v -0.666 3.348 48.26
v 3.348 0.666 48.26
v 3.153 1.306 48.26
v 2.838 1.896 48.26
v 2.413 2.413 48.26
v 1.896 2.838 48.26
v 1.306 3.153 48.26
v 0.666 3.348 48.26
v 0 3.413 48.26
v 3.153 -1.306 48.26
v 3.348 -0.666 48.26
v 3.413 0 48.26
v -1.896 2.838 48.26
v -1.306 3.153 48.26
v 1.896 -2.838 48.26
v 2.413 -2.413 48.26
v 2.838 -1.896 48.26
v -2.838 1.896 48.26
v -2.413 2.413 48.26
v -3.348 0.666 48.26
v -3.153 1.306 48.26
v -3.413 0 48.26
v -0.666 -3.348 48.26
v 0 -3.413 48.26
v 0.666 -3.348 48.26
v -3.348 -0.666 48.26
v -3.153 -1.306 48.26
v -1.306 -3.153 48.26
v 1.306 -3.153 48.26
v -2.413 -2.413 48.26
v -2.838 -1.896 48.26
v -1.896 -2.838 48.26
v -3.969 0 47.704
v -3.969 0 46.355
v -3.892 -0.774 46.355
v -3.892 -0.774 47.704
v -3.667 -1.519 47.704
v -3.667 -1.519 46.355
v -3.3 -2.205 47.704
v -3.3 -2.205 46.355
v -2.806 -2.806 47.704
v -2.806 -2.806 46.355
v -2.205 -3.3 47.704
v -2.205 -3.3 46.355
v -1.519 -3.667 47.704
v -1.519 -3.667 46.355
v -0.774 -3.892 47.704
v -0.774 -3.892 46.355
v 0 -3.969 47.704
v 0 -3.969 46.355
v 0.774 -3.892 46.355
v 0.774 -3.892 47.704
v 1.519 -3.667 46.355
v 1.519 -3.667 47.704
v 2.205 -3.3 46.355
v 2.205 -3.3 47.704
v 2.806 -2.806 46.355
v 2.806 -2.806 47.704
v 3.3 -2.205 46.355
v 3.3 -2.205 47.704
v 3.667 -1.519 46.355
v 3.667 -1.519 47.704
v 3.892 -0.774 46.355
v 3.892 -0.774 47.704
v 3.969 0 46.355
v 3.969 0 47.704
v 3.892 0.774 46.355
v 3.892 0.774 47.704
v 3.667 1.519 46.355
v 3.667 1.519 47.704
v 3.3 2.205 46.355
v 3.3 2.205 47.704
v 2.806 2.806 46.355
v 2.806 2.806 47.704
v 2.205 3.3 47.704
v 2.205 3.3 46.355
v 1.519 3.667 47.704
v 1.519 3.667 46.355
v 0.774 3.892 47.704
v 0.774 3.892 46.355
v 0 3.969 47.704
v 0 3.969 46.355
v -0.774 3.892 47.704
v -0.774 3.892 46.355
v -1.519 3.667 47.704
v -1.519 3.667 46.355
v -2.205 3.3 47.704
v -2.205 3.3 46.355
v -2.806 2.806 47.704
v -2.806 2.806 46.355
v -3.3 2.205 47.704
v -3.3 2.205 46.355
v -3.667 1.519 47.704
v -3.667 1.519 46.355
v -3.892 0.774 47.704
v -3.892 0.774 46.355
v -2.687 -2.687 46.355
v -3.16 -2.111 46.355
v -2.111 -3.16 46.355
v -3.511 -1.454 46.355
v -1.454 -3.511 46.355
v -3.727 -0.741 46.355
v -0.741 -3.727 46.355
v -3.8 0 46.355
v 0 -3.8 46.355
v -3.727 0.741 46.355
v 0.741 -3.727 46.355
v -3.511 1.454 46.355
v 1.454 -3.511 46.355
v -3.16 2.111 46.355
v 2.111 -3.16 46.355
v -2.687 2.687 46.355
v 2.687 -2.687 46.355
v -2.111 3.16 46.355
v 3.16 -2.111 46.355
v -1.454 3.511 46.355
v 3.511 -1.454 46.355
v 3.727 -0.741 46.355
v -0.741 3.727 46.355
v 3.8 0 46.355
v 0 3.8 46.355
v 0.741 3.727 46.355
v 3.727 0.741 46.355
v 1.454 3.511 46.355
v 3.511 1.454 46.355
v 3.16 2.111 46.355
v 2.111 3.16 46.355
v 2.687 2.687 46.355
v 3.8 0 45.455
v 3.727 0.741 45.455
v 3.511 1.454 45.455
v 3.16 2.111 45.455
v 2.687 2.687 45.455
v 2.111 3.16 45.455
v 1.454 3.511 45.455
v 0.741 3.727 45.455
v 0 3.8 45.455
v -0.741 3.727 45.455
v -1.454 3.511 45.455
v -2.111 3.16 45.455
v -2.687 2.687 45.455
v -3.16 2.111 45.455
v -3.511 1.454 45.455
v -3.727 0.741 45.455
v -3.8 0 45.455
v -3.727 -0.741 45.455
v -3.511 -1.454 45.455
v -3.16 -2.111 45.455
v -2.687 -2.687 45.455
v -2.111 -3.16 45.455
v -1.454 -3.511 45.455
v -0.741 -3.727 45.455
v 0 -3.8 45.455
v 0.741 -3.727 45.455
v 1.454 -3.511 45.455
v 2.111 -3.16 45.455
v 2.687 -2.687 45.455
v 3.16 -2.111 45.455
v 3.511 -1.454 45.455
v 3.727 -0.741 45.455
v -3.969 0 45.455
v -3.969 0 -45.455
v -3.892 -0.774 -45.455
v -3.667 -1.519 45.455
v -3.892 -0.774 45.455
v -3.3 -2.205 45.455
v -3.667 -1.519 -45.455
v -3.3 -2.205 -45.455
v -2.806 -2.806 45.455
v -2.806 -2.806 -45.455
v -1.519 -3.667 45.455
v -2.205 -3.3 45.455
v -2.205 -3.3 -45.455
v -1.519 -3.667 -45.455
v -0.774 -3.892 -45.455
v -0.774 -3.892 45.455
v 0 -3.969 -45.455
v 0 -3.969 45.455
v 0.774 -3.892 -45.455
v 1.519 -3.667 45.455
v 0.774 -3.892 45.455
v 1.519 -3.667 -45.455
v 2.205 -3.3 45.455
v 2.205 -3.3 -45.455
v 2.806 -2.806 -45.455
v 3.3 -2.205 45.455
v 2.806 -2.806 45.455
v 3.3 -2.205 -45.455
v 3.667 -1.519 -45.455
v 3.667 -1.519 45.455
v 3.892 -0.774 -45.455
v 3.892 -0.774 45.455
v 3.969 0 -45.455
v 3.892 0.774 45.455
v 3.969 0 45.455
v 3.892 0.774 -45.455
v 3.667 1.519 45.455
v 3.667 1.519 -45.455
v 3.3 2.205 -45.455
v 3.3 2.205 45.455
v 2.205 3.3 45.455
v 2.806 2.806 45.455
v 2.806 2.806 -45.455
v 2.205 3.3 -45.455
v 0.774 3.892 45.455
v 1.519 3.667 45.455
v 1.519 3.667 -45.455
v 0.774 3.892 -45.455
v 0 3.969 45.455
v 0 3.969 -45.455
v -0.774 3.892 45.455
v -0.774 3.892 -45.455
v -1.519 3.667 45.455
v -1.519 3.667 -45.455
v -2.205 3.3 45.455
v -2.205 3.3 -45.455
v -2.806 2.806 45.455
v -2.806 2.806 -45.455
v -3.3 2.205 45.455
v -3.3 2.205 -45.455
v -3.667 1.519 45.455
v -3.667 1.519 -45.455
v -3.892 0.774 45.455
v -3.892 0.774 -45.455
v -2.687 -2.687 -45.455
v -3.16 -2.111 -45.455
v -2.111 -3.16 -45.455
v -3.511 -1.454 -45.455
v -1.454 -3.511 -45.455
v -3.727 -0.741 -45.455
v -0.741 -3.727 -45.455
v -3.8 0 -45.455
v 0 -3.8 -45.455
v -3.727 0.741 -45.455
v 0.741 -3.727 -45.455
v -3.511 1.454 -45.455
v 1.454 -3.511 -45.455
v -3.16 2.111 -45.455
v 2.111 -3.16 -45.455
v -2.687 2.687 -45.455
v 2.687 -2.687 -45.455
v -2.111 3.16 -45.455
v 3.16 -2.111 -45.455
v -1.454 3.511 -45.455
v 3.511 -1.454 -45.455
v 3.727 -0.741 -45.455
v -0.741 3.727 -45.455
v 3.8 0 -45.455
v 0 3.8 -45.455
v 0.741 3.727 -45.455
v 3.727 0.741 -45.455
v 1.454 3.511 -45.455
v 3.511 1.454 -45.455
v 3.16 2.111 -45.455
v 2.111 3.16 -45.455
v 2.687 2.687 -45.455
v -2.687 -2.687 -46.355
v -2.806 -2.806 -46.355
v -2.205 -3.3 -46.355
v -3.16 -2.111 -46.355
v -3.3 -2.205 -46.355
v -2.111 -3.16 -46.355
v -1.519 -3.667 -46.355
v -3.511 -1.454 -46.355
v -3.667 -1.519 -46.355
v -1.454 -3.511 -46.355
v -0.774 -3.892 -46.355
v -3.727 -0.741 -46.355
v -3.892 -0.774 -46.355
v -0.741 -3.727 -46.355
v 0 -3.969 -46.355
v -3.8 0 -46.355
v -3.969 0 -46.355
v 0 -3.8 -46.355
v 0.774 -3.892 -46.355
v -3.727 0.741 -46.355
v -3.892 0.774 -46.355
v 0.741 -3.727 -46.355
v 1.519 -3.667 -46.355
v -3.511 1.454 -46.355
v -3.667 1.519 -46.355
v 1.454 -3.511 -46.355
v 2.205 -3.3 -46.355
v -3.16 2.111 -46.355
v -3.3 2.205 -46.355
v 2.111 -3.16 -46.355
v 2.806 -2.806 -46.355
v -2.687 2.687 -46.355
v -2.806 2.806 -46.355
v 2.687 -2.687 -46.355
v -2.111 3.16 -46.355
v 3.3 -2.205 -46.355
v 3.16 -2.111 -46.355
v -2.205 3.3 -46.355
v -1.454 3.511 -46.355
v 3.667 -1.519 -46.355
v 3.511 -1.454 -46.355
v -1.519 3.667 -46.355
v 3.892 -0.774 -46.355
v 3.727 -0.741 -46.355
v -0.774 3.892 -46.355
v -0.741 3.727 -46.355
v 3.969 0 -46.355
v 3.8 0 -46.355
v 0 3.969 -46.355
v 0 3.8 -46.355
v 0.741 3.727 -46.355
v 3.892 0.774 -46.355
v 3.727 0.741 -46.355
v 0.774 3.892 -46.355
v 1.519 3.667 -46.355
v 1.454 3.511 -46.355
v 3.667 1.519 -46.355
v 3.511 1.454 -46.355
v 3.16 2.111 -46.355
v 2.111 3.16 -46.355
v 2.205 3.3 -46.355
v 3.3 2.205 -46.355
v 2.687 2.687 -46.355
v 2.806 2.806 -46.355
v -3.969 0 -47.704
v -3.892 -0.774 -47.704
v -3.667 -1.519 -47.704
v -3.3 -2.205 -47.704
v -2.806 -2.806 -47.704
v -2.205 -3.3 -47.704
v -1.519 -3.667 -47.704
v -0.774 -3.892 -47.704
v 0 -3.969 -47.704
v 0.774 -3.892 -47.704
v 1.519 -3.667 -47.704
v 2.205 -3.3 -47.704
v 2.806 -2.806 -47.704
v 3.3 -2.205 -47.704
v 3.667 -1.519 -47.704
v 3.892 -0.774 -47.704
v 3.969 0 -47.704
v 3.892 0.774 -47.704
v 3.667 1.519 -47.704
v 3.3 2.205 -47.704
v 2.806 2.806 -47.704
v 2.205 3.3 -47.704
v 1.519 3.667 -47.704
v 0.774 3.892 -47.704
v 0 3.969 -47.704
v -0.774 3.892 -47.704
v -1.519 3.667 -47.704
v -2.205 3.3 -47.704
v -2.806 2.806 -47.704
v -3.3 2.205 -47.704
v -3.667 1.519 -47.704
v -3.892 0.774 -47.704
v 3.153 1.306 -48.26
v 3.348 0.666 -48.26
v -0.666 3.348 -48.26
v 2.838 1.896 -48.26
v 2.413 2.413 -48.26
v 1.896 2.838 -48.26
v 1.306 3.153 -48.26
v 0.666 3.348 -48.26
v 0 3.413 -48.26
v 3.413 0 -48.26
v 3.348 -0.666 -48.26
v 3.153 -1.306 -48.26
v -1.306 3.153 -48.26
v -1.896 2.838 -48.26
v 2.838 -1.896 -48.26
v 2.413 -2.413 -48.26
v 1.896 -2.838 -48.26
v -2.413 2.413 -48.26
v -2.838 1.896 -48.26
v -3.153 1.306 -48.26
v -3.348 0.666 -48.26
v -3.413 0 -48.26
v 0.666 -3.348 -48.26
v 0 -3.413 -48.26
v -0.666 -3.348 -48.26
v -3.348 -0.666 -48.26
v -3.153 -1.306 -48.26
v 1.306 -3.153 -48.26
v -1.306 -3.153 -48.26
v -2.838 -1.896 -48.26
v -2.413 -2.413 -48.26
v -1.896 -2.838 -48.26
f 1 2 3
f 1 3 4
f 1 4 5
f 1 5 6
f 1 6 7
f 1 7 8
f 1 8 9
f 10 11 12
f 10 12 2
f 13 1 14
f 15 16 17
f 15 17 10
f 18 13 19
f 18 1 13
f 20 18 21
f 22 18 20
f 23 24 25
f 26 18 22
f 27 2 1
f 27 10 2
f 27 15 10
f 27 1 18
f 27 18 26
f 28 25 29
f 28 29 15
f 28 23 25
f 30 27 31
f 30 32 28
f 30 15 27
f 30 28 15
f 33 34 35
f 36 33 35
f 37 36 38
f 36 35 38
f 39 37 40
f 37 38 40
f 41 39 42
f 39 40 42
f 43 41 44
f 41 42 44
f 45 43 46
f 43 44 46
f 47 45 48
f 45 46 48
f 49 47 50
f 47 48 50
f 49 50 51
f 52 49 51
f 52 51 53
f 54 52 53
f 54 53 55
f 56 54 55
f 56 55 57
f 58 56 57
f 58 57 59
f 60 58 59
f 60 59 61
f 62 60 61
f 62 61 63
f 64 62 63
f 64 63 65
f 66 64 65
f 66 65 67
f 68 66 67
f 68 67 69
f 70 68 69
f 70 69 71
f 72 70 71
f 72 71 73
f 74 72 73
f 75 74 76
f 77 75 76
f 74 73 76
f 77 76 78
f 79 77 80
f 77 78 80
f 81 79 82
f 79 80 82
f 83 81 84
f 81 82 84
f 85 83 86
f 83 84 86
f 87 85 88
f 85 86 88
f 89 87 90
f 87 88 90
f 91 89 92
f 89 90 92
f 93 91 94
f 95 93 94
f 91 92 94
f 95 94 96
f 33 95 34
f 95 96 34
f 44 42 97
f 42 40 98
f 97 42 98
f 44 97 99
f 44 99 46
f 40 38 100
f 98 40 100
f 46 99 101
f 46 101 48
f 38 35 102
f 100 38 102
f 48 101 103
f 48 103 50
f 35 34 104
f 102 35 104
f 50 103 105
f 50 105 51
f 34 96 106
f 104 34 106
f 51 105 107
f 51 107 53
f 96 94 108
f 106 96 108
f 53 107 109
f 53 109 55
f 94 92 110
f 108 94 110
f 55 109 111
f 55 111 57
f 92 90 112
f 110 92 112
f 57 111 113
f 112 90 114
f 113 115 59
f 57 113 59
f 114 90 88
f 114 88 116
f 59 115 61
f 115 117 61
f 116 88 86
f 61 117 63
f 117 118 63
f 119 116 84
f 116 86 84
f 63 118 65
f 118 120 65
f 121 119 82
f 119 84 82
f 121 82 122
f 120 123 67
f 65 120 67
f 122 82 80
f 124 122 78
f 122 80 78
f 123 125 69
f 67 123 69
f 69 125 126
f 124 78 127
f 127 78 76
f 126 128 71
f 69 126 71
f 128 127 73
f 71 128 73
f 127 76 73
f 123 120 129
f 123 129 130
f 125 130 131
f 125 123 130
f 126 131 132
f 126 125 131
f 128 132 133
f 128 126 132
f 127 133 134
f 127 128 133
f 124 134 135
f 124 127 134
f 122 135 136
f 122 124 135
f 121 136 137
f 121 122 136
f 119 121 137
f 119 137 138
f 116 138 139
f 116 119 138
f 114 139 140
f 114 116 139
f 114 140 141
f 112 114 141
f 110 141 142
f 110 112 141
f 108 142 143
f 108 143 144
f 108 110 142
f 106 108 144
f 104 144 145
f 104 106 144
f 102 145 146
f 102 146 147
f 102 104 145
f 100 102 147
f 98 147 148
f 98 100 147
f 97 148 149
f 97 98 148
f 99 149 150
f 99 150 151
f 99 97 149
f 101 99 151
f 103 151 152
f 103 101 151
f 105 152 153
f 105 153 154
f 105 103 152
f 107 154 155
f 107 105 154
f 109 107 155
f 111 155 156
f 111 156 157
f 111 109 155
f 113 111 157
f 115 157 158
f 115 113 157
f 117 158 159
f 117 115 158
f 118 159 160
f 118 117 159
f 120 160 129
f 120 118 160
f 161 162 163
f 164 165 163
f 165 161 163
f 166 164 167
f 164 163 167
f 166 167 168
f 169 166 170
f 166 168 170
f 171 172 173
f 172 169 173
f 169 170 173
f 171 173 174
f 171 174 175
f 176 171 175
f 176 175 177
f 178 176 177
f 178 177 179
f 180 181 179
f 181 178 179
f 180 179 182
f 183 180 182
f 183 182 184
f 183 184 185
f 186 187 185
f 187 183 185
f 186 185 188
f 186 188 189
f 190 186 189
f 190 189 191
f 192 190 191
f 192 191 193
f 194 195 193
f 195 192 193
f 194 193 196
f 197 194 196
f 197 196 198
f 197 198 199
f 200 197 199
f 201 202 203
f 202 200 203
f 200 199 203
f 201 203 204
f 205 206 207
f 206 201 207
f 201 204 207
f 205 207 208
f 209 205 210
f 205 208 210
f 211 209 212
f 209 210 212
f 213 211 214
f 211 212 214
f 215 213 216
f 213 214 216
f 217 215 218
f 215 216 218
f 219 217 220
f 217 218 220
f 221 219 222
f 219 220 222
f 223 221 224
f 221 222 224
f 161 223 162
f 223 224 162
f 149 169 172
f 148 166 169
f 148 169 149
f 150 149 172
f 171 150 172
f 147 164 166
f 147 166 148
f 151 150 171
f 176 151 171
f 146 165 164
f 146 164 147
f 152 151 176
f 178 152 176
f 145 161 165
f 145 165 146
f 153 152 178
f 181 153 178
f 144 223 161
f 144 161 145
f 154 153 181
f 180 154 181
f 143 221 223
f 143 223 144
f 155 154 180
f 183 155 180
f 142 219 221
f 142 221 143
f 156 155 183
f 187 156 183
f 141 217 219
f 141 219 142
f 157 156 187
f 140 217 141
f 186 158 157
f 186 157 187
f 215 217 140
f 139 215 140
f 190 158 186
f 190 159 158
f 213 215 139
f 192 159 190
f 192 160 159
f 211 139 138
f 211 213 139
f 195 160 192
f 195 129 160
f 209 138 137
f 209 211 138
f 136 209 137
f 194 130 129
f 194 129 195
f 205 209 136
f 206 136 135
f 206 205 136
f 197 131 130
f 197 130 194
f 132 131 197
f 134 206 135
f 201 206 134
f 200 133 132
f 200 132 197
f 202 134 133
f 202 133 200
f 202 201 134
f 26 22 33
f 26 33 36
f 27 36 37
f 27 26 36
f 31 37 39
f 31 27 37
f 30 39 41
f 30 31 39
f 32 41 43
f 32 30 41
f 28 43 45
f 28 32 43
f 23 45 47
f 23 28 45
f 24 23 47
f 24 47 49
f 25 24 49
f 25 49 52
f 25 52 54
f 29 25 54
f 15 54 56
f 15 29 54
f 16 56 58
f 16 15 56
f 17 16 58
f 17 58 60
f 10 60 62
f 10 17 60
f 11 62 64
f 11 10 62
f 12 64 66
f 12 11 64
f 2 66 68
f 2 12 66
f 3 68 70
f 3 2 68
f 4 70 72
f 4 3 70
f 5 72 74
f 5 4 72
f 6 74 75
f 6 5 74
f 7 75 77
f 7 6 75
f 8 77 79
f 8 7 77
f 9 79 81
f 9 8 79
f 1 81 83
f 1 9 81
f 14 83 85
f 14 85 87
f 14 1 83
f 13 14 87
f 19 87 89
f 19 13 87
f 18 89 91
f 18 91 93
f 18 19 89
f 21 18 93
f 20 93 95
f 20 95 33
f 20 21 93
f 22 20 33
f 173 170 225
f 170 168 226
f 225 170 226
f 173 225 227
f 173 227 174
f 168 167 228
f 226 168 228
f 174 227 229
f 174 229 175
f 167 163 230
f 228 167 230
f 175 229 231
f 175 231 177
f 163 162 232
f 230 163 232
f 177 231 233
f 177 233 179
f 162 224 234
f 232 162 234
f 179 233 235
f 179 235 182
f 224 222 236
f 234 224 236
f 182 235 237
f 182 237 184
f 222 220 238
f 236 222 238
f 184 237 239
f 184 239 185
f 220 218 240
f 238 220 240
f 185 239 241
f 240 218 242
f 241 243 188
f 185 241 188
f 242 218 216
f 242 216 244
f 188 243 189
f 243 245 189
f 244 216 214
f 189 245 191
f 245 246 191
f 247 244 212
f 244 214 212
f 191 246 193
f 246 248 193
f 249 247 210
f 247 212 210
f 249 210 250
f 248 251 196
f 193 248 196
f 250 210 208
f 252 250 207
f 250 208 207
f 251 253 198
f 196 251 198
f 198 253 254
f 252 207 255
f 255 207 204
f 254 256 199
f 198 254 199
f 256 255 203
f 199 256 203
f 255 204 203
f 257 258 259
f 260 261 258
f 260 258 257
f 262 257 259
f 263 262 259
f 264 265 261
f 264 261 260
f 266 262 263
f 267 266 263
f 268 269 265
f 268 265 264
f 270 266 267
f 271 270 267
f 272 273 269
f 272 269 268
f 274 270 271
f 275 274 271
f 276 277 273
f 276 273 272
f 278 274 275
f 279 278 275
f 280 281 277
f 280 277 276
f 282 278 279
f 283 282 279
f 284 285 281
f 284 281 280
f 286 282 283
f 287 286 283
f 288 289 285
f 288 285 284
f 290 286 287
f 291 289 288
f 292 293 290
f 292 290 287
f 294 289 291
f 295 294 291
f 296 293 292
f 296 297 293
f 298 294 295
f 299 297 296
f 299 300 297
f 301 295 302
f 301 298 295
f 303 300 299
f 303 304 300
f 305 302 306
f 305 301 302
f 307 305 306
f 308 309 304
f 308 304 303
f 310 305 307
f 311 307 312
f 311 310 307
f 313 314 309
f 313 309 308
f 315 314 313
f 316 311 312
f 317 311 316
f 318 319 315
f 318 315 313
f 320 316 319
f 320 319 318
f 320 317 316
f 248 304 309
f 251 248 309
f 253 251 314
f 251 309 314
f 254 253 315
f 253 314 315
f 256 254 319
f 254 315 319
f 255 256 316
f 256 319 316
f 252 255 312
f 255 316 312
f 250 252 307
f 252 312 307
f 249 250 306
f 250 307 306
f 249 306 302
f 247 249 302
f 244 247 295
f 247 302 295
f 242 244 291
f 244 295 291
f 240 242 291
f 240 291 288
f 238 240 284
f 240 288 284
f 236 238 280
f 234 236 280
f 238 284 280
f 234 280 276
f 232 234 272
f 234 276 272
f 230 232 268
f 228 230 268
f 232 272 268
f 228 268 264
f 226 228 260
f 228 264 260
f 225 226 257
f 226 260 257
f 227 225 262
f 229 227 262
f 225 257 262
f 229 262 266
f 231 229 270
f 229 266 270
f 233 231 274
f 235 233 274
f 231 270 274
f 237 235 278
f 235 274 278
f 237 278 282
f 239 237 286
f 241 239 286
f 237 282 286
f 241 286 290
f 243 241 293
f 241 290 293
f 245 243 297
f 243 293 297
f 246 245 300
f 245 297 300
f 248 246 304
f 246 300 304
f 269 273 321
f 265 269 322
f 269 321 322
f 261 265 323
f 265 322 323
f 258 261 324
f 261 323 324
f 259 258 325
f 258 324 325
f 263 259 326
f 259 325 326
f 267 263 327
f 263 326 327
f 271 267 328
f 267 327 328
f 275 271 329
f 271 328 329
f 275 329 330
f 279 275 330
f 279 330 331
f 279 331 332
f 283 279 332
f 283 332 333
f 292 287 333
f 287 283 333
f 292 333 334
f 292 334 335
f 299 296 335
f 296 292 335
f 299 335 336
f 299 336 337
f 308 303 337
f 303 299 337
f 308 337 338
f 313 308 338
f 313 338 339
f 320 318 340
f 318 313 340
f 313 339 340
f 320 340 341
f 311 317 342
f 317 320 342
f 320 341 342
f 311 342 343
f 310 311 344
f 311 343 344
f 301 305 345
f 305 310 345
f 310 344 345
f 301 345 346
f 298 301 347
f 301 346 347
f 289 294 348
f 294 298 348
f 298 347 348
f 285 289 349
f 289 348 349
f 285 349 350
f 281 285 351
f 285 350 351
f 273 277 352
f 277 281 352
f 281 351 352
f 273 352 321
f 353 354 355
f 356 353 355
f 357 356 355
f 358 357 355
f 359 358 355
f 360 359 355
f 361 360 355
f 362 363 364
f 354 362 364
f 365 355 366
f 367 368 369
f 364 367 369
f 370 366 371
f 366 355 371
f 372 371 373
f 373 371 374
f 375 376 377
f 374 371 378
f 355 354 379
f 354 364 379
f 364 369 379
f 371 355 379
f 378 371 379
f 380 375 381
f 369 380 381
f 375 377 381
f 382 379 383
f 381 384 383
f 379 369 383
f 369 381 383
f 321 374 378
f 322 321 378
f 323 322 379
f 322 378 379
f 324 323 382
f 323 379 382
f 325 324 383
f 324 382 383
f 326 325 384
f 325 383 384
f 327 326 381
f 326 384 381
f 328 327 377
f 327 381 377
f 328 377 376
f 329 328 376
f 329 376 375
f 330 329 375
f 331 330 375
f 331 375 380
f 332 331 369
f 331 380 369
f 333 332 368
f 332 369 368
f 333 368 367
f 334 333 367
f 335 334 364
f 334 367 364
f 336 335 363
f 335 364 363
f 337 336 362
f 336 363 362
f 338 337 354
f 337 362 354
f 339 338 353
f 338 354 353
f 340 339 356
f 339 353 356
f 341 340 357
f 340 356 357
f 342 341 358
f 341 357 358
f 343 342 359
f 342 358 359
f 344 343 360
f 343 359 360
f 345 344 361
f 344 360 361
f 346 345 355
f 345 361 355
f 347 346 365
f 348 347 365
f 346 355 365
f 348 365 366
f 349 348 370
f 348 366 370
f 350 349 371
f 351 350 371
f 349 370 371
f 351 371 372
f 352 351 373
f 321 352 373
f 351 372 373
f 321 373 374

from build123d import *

# Parameters (mm, degrees)
BOSS_EXTRUDE1_DEPTH      = 48.26
BOSS_EXTRUDE1_DEPTH_BACK = 48.26
SKETCH3_R                = 3.96875
CHAMFER1_SIZE            = 0.555625
CUT_EXTRUDE1_START       = -1.905
SKETCH4_R                = 18.115105144
SKETCH4_R_2              = 3.8
CUT_EXTRUDE1_DEPTH       = 0.899999978


with BuildPart() as part:
    # Sketch3 → Boss-Extrude1 (new, two sides: drawn at the far end of the back side and taken through both)
    with BuildSketch(Plane.XY.offset(-BOSS_EXTRUDE1_DEPTH_BACK)):
        with Locations(Location((0, 0, 0), (0, 0, 180))):
            Circle(SKETCH3_R)
    extrude(amount=BOSS_EXTRUDE1_DEPTH + BOSS_EXTRUDE1_DEPTH_BACK)

    # Chamfer1
    chamfer1_edges = [part.edges().sort_by_distance(p)[0] for p in [
        (3.96875, 0, -48.26),
        (3.96875, 0, 48.26),
    ]]
    chamfer(chamfer1_edges, length=CHAMFER1_SIZE)

    # Sketch4 → Cut-Extrude1 (cut)
    with BuildSketch(Plane.XY.offset(48.26).offset(CUT_EXTRUDE1_START)):
        Circle(SKETCH4_R)
        Circle(SKETCH4_R_2, mode=Mode.SUBTRACT)
    cut_extrude1 = extrude(amount=-CUT_EXTRUDE1_DEPTH, mode=Mode.SUBTRACT)

    # Mirror1: Cut-Extrude1 across plane
    add(cut_extrude1.mirror(Plane.XY), mode=Mode.SUBTRACT)


solid = part.part
